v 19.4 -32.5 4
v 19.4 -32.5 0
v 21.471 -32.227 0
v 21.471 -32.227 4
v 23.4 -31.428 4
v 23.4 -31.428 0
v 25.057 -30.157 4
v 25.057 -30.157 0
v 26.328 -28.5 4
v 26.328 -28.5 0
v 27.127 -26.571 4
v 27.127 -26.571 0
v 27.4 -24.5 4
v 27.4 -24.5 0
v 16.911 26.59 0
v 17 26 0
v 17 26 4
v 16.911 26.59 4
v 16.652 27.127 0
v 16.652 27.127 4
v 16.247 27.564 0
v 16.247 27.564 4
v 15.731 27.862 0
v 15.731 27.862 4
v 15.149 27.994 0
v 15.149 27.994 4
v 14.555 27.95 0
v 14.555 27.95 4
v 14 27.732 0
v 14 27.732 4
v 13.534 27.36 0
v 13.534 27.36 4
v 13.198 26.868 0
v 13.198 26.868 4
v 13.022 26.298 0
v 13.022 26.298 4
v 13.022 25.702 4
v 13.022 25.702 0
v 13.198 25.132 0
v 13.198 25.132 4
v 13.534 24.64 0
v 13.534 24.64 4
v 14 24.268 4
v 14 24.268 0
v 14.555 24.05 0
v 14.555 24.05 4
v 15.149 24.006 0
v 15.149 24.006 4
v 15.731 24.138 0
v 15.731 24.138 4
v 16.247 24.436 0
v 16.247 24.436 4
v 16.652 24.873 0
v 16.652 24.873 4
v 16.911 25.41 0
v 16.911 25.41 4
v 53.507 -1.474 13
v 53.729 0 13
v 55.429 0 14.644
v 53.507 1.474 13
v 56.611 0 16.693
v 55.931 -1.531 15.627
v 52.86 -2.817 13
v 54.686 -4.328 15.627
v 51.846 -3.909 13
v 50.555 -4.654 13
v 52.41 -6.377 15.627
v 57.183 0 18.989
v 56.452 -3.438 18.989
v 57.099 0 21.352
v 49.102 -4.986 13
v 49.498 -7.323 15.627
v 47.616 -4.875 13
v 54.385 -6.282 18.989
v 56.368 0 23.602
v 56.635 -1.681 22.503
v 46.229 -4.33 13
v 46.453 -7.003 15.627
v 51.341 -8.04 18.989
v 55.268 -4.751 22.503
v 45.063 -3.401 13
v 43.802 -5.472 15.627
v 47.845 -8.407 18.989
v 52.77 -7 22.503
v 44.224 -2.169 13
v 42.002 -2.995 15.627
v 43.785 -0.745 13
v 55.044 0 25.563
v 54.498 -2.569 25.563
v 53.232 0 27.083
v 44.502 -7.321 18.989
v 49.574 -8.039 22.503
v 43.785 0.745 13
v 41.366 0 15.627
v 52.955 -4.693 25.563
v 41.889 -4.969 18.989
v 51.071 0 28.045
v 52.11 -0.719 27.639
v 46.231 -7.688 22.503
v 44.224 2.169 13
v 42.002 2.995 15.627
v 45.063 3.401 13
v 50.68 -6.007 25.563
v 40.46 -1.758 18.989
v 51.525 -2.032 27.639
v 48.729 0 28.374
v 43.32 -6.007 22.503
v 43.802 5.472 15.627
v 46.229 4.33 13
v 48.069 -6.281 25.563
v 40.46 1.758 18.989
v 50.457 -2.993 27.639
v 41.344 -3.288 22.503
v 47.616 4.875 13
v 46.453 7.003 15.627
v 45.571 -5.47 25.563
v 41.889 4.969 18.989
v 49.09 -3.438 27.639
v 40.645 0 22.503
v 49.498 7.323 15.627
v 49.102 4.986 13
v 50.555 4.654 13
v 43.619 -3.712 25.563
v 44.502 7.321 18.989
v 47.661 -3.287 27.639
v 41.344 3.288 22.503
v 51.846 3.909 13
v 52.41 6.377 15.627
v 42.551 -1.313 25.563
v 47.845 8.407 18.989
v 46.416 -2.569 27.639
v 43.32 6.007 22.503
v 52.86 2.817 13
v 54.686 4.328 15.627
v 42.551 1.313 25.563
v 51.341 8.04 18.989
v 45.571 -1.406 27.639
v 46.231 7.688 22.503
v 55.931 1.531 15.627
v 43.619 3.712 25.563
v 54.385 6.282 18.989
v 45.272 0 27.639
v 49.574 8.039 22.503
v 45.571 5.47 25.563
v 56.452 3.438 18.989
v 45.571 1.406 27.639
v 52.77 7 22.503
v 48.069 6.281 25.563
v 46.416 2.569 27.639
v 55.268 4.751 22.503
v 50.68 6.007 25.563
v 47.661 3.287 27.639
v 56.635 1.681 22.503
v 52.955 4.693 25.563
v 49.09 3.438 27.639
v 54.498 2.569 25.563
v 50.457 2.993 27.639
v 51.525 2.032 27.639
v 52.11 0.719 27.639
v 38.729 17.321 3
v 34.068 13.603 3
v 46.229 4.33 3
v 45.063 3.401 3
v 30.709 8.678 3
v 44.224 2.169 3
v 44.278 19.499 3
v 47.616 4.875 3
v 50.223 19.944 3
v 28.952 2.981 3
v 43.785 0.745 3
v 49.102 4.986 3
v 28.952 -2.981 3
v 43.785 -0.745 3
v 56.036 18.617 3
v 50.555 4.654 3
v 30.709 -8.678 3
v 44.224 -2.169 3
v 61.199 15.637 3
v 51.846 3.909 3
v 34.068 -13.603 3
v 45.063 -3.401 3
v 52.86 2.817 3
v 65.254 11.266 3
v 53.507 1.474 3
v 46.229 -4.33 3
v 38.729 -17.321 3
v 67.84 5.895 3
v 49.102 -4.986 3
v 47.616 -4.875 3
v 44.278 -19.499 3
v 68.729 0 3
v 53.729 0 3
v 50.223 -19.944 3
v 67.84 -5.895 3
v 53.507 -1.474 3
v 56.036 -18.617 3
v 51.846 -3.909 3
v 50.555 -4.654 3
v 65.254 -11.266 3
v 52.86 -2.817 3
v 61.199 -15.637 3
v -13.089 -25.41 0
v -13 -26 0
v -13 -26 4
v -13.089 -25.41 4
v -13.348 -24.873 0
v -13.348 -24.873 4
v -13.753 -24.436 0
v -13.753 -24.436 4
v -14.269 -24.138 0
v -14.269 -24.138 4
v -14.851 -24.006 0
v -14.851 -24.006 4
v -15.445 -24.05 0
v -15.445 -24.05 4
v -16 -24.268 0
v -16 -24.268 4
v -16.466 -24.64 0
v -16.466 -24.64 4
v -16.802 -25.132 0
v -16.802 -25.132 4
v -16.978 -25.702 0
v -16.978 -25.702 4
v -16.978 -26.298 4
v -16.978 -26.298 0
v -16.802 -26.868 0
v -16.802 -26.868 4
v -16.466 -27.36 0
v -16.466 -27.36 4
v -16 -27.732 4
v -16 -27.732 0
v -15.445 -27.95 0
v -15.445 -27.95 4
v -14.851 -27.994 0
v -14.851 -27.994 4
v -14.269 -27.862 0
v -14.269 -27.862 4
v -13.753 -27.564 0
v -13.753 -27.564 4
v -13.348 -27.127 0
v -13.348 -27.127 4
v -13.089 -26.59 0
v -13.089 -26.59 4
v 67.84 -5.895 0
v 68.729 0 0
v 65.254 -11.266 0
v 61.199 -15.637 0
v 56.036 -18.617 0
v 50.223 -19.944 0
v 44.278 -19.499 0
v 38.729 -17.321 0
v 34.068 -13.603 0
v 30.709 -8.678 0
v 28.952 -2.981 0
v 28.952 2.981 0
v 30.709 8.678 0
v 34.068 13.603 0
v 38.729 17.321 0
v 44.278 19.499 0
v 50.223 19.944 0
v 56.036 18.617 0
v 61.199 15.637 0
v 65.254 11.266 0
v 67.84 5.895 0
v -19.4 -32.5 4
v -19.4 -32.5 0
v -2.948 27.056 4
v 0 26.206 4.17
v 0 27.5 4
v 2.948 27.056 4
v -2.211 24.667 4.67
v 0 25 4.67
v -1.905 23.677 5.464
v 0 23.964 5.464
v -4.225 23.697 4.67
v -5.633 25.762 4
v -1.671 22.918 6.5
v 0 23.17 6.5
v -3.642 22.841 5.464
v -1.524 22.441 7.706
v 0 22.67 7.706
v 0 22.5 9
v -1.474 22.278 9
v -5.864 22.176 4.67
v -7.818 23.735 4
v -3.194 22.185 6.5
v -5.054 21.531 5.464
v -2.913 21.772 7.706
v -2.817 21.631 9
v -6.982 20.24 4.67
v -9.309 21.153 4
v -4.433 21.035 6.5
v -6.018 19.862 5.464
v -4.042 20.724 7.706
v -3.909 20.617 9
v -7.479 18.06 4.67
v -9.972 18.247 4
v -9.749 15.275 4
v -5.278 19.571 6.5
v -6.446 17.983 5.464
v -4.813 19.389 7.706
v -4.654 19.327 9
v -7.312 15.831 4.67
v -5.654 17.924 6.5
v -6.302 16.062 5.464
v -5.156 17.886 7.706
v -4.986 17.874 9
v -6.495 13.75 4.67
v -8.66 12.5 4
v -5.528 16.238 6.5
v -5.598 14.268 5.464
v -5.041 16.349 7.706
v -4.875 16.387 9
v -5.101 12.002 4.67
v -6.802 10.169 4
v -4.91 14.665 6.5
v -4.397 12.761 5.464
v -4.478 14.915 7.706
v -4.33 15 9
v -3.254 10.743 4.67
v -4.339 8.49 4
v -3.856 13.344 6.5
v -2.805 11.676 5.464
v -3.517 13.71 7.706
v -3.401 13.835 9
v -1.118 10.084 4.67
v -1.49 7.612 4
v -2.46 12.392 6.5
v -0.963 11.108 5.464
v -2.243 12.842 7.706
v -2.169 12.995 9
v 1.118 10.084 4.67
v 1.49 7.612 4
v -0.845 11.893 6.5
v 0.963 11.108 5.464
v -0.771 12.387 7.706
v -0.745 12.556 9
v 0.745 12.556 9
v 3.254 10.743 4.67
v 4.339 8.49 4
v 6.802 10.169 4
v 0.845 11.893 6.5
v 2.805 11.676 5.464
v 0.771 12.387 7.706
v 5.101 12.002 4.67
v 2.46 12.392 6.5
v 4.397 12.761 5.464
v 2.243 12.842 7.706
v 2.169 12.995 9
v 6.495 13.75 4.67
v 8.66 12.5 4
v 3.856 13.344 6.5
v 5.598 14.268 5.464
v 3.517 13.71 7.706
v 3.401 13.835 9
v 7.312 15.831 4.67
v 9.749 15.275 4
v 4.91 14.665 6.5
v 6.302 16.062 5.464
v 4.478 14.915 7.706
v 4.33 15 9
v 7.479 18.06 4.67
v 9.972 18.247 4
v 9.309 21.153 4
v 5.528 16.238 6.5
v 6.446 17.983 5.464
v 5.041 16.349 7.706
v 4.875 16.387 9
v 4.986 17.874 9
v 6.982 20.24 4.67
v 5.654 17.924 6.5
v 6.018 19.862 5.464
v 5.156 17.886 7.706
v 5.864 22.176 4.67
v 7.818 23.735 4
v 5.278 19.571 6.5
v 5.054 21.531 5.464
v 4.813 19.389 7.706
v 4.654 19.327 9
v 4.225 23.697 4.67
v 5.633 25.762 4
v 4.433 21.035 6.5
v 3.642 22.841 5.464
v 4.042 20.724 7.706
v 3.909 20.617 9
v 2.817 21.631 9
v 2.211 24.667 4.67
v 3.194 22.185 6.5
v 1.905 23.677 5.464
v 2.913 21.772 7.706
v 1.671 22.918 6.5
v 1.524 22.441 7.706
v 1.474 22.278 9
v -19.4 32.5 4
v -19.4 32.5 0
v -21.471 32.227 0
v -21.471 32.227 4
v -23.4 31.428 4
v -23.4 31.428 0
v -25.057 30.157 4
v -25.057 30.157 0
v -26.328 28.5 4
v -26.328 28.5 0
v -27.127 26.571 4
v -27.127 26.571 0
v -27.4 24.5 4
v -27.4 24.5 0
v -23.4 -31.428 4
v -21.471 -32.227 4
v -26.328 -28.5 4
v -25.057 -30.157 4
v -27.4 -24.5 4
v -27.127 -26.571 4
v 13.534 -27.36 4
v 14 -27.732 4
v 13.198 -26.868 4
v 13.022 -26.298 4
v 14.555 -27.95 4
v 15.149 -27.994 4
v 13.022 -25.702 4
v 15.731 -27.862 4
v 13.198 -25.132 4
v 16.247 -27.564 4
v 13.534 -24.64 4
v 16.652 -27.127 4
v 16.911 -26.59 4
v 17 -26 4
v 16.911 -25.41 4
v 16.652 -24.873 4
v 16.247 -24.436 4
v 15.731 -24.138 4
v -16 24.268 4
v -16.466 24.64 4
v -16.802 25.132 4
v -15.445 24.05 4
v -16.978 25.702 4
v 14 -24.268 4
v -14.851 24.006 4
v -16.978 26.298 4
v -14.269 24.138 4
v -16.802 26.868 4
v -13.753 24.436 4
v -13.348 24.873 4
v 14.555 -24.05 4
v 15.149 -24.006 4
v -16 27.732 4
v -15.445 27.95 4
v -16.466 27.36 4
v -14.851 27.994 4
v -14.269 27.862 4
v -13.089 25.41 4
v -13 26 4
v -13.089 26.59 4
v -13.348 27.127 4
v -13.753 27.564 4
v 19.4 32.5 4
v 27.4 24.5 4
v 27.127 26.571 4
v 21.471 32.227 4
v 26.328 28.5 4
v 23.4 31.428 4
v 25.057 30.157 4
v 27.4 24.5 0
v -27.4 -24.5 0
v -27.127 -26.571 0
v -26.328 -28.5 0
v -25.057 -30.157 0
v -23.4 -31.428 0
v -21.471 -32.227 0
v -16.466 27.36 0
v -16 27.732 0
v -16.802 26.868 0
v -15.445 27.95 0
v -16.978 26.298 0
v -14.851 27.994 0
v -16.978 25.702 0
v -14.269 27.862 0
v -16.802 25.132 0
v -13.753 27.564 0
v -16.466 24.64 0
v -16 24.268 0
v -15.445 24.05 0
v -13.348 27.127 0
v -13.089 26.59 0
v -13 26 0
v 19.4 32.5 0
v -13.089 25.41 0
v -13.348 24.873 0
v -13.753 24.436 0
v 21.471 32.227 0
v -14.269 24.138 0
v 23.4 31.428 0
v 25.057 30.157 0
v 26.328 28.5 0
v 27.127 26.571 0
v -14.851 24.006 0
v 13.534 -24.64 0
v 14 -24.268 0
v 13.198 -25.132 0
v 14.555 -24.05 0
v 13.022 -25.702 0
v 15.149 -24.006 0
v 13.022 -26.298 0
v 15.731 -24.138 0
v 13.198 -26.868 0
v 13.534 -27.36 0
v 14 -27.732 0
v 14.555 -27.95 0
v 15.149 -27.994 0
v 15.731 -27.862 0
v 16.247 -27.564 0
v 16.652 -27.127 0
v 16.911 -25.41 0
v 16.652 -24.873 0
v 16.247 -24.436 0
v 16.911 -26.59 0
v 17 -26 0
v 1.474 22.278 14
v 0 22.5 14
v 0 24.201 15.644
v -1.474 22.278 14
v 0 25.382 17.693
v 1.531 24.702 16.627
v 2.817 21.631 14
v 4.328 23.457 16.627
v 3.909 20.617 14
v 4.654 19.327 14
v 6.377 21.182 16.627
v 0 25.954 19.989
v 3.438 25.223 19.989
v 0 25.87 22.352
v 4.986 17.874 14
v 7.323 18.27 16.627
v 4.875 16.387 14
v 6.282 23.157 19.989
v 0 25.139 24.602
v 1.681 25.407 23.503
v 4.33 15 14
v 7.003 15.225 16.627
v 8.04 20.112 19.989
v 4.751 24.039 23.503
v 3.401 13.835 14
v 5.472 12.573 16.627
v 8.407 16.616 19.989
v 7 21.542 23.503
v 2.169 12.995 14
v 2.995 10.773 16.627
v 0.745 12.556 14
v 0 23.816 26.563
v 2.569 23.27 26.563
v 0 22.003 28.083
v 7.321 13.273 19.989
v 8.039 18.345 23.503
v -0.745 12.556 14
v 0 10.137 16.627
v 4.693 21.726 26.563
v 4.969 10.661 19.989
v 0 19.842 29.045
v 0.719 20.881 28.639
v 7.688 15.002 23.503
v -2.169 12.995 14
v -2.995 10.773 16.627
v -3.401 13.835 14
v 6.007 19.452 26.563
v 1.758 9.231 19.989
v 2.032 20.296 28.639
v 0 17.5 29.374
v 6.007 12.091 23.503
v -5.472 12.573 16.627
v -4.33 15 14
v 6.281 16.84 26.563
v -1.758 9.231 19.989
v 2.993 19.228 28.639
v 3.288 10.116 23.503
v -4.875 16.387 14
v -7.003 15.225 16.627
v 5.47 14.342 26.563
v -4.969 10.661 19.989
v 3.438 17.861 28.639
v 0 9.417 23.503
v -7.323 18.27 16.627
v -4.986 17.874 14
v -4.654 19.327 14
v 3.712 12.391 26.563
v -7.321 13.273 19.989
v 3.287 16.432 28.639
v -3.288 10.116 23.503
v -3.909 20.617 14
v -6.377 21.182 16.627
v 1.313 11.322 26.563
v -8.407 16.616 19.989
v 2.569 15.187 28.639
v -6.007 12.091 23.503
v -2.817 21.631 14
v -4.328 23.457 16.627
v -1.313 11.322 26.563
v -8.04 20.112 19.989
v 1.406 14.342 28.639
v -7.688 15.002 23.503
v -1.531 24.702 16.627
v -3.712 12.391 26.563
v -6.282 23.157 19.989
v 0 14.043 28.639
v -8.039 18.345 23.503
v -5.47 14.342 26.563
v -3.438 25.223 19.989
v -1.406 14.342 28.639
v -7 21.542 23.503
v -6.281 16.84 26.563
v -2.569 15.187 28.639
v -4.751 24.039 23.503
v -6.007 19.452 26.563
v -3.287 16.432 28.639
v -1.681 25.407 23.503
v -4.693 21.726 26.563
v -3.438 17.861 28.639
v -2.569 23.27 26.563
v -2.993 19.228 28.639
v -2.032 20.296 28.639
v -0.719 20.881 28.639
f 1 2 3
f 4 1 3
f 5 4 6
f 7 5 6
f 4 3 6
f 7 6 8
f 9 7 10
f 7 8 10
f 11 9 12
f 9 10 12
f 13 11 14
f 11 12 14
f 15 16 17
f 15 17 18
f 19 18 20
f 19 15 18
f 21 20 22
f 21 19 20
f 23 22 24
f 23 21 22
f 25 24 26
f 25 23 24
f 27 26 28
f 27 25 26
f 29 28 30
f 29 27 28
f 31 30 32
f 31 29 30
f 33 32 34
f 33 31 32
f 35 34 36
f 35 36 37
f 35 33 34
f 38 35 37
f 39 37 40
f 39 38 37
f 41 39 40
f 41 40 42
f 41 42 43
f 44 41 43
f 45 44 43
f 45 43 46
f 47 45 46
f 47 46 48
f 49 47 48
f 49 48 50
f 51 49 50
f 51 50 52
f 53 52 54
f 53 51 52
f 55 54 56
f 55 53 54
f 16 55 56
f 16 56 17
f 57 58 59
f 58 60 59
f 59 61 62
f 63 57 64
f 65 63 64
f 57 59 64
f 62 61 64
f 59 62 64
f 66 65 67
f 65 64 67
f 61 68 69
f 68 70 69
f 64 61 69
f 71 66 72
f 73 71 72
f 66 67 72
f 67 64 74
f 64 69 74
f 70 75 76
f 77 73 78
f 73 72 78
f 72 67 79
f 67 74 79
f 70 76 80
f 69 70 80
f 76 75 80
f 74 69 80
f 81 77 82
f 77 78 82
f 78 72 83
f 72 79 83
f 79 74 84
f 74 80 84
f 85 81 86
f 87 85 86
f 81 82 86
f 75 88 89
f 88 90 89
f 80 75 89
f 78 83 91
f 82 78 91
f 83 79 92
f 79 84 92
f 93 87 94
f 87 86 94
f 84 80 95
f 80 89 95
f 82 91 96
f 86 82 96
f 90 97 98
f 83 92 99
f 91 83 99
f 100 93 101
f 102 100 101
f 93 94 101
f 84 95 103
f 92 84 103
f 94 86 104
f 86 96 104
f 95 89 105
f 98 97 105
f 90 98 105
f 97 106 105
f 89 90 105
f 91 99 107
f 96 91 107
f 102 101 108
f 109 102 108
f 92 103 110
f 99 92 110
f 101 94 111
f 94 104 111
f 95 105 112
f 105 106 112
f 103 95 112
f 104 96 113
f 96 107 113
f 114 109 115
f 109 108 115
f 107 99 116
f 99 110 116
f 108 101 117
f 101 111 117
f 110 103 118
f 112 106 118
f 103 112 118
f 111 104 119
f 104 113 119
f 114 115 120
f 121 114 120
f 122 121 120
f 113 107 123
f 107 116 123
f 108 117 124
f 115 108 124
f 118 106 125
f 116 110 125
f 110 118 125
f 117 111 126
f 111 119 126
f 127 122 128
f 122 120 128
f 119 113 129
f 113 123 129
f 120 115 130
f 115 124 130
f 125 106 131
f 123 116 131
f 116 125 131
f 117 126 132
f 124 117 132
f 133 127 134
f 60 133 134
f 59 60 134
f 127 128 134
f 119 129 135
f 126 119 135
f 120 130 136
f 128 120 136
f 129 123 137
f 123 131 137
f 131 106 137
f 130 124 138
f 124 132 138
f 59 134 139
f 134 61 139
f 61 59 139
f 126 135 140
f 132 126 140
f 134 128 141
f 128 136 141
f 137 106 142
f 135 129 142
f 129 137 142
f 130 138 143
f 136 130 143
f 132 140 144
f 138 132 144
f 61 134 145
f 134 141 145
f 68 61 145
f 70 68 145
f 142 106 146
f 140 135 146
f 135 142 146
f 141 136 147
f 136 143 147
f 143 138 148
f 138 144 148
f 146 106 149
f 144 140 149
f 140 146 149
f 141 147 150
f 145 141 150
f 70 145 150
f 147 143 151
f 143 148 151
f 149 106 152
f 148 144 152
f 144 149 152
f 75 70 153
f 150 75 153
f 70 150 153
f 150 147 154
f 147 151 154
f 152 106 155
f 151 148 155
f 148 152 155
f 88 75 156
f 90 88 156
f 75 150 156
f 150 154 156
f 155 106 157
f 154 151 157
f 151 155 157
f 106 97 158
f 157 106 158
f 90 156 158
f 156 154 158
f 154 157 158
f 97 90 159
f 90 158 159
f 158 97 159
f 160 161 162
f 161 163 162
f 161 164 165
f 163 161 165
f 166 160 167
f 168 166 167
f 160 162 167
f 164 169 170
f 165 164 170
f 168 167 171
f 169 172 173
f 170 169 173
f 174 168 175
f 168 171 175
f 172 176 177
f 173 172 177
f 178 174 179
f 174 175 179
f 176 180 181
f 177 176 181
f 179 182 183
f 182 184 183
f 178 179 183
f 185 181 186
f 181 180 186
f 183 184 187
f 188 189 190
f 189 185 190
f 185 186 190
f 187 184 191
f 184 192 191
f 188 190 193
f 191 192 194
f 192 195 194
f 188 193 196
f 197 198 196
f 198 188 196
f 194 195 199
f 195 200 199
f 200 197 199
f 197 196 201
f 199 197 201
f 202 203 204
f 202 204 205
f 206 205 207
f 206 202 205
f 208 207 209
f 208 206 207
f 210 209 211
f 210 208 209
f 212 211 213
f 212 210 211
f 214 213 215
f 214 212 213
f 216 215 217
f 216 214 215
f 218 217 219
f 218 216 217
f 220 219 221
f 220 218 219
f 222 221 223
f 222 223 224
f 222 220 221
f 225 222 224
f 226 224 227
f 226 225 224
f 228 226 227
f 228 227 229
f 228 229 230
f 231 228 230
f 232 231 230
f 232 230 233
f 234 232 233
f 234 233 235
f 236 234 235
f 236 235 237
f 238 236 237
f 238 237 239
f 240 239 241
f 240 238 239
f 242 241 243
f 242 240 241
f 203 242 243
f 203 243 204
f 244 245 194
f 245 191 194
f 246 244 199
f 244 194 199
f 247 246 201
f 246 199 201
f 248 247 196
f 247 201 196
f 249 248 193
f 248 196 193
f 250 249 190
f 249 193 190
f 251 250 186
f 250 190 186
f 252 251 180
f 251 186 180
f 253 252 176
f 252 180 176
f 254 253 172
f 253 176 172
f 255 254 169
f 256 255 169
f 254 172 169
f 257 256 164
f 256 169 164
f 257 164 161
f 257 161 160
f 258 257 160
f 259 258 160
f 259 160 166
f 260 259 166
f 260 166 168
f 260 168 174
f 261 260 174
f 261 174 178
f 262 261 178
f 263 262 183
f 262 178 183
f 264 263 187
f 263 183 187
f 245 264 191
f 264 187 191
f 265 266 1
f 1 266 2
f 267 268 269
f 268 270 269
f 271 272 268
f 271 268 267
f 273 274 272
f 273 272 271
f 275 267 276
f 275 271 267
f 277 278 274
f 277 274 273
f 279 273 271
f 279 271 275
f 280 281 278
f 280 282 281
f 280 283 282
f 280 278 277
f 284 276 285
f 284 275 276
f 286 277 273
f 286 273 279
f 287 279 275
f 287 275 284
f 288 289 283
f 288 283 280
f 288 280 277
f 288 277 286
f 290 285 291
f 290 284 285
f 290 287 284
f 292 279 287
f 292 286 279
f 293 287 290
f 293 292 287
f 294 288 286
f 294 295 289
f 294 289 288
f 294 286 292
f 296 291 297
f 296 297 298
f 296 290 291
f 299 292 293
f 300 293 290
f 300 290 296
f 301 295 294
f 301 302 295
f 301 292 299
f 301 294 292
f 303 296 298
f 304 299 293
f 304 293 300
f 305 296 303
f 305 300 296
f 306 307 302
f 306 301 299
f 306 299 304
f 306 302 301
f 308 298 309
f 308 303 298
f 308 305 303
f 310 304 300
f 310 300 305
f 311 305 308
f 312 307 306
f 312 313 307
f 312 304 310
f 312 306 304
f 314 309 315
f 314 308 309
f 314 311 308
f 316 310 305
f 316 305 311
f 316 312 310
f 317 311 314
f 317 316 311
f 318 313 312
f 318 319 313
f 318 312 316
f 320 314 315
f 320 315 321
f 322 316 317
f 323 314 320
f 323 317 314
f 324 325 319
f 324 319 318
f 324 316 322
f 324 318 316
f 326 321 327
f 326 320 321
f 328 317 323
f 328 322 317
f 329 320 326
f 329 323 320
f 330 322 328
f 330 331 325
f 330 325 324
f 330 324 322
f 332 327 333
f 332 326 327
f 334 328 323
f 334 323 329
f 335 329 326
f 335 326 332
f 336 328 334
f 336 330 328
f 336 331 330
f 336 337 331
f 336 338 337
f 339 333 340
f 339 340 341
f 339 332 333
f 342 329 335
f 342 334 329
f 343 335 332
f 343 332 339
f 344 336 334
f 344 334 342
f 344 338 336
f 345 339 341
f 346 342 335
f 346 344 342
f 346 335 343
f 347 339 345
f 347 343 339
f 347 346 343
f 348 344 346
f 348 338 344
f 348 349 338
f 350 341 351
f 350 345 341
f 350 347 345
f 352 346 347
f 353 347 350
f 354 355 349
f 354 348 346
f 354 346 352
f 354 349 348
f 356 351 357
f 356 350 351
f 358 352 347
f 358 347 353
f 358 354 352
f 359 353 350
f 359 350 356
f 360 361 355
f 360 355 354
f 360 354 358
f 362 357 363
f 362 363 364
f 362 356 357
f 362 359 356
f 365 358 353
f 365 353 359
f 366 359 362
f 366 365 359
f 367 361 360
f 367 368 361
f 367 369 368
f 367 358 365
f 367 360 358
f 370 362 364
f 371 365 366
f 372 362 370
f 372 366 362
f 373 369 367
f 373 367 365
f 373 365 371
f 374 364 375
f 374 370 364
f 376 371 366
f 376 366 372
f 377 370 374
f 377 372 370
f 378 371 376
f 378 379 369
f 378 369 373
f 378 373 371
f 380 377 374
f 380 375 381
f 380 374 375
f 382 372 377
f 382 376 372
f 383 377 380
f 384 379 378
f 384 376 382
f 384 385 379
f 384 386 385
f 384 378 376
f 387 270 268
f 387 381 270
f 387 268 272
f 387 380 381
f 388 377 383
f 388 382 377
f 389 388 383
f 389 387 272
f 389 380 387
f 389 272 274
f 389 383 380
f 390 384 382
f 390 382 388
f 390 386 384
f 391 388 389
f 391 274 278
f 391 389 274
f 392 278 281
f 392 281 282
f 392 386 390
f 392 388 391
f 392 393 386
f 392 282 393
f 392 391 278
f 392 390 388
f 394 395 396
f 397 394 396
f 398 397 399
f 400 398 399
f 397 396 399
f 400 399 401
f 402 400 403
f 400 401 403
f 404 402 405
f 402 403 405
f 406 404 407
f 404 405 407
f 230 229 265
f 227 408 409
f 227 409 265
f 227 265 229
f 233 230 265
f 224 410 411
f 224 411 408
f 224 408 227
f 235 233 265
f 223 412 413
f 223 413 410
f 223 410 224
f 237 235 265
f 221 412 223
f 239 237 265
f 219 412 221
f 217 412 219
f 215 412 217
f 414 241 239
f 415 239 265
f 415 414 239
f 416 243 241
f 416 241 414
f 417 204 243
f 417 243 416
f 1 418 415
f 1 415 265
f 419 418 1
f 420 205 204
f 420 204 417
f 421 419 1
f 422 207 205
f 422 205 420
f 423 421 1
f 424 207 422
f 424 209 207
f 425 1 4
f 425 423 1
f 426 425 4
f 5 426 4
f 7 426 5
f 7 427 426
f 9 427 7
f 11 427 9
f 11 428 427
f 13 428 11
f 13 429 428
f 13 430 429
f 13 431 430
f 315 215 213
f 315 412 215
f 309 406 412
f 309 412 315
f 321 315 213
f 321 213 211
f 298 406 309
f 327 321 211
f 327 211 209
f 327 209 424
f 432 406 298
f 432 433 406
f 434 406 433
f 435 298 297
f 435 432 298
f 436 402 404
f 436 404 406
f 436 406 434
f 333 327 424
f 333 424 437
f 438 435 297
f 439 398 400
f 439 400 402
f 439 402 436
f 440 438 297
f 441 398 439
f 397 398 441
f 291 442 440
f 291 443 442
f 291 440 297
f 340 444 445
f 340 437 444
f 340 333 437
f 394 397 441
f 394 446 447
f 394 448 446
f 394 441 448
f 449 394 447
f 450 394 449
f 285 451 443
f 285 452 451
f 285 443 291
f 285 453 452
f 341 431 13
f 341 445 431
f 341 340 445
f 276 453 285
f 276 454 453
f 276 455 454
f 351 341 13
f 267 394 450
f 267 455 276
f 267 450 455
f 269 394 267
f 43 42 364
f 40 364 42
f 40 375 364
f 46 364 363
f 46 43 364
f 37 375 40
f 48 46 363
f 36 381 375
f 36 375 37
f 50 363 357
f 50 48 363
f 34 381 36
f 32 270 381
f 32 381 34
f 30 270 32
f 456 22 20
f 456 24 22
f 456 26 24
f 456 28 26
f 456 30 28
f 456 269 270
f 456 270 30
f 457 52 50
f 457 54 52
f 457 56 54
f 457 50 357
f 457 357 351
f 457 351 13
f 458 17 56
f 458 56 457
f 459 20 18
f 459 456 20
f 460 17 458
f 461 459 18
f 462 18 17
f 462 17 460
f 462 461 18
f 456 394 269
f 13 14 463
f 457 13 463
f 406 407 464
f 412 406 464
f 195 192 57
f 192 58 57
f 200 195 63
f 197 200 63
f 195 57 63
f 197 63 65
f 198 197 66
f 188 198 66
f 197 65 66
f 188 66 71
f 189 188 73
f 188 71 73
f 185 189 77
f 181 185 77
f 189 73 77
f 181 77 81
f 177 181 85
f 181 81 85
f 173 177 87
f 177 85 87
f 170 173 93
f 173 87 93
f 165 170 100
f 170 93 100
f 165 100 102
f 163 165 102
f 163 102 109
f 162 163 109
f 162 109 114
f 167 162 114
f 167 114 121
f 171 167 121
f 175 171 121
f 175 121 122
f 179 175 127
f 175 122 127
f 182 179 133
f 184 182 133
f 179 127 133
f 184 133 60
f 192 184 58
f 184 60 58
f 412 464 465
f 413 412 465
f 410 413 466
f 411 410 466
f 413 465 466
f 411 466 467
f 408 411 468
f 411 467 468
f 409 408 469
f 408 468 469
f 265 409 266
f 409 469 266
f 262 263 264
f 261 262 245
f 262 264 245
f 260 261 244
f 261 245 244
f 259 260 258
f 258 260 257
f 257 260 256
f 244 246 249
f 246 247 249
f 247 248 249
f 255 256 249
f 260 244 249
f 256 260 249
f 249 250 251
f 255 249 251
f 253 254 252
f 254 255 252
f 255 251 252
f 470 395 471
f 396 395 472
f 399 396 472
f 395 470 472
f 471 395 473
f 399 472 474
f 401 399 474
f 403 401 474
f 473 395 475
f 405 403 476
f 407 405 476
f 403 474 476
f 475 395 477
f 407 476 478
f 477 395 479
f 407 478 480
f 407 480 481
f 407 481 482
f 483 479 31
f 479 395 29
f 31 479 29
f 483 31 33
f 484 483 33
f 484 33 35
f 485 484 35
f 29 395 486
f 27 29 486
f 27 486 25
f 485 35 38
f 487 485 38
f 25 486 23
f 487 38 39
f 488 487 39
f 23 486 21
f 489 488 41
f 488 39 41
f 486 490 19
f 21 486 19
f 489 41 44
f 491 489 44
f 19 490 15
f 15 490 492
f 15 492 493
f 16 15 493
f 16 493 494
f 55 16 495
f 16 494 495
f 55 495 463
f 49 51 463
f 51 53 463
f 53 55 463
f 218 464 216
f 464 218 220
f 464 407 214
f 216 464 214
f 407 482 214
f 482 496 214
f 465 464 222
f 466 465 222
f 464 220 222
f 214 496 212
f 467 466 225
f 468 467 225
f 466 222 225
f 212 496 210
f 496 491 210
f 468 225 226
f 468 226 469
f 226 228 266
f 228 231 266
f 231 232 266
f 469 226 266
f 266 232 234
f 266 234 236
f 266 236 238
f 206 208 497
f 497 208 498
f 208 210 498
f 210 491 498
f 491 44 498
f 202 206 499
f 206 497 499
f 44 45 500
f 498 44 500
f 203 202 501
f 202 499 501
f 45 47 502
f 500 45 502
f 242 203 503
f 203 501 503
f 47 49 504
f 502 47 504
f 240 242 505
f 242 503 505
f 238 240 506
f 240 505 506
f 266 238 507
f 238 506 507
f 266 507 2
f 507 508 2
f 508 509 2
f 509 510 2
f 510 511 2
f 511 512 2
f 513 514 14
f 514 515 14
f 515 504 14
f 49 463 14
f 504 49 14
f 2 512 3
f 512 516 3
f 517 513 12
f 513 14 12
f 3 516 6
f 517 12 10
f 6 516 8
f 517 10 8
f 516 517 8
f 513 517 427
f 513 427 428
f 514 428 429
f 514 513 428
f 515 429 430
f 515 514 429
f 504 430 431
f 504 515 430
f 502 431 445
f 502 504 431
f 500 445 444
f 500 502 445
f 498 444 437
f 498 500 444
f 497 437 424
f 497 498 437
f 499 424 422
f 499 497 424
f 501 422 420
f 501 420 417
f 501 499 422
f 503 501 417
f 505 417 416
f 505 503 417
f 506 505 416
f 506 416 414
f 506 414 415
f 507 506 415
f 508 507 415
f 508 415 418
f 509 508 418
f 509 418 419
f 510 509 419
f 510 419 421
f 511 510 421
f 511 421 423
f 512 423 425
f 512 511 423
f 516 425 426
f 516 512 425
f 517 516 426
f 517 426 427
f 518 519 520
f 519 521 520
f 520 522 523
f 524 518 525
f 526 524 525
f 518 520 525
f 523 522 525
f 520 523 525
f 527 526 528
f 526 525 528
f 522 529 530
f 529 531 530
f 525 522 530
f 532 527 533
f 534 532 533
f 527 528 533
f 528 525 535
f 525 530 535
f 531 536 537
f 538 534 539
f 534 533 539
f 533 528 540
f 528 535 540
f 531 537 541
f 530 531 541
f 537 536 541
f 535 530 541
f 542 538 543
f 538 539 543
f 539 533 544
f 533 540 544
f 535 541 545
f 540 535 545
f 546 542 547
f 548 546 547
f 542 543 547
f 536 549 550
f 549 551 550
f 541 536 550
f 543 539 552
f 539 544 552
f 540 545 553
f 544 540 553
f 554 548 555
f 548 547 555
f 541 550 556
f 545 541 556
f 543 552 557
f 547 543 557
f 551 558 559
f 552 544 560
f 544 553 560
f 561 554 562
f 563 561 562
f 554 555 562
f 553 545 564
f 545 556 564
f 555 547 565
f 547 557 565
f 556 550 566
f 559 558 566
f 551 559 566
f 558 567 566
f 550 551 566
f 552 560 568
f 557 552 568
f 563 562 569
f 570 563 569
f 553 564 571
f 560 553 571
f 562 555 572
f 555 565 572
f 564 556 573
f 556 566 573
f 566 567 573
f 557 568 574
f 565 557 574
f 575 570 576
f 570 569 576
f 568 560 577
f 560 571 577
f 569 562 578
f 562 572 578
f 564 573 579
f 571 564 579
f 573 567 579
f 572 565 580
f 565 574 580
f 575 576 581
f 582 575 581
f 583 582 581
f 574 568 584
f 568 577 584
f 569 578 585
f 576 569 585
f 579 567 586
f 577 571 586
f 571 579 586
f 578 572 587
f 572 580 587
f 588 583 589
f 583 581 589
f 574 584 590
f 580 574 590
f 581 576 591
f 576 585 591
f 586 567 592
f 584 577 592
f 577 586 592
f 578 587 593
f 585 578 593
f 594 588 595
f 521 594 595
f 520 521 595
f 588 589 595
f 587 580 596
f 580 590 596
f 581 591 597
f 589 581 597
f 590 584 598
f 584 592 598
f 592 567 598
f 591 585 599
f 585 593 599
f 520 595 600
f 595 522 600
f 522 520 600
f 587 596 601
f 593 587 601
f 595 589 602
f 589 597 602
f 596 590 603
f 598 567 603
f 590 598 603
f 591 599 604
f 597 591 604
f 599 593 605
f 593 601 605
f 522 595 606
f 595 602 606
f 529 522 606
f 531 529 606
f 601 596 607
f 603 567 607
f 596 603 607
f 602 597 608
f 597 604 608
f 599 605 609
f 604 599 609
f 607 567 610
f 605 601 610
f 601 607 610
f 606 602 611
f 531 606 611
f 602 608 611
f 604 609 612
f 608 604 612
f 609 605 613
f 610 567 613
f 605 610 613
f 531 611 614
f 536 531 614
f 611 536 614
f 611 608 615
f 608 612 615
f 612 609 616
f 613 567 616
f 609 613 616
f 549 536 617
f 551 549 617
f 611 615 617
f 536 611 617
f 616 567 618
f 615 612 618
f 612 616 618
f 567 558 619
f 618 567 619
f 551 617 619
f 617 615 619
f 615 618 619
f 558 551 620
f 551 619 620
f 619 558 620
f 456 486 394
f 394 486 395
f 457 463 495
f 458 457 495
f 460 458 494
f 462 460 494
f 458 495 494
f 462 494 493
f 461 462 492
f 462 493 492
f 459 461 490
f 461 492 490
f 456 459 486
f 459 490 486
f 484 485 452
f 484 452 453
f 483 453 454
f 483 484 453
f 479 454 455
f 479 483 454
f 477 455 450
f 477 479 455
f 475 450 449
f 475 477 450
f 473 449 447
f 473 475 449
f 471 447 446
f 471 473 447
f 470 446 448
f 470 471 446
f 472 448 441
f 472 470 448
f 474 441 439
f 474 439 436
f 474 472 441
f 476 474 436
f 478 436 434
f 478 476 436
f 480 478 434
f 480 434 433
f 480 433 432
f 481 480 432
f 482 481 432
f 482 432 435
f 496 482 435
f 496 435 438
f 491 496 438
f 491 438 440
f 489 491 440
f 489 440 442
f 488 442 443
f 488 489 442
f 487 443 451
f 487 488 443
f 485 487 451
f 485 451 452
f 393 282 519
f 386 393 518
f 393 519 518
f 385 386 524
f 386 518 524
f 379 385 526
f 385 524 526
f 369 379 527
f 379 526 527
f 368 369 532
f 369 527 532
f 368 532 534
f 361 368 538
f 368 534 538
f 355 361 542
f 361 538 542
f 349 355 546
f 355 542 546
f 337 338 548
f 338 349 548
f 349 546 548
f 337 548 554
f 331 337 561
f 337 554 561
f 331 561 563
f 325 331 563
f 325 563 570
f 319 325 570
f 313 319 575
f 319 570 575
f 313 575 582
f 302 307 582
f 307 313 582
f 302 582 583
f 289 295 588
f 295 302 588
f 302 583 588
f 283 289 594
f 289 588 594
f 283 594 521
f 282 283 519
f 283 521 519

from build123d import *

# Parameters (mm, degrees)
F0_R     = 2
F1_DEPTH = 4
F4_R     = 5


with BuildPart() as f1:
    # F0 (on Top) → F1 (new body)
    with BuildSketch(Plane.XY):
        with BuildLine():
            ThreePointArc((-27.4, -24.5), (-25.0568542495, -30.1568542495), (-19.4, -32.5))
            Line((-19.4, -32.5), (19.4, -32.5))
            ThreePointArc((19.4, -32.5), (25.0568542495, -30.1568542495), (27.4, -24.5))
            Line((27.4, -24.5), (27.4, 24.5))
            ThreePointArc((27.4, 24.5), (25.0568542495, 30.1568542495), (19.4, 32.5))
            Line((19.4, 32.5), (-19.4, 32.5))
            ThreePointArc((-19.4, 32.5), (-25.0568542495, 30.1568542495), (-27.4, 24.5))
            Line((-27.4, 24.5), (-27.4, -24.5))
        make_face()
        with Locations((-15, -26)):
            Circle(F0_R, mode=Mode.SUBTRACT)
        with Locations((15, -26)):
            Circle(F0_R, mode=Mode.SUBTRACT)
        with Locations((-15, 26)):
            Circle(F0_R, mode=Mode.SUBTRACT)
        with Locations((15, 26)):
            Circle(F0_R, mode=Mode.SUBTRACT)
    extrude(amount=F1_DEPTH)

    # F2 (on Right) → F3 (revolve)
    with BuildSketch(Plane.YZ):
        with BuildLine():
            Line((17.5, 20.8738635424), (17.5, 0))
            Line((17.5, 0), (22.5, 0))
            Line((22.5, 0), (22.5, 14))
            ThreePointArc((22.5, 14), (25.5832493501, 23.5027568352), (17.5, 29.3738635424))
            Line((17.5, 29.3738635424), (17.5, 20.8738635424))
        make_face()
    revolve(axis=Axis((0, 17.5, 10.4369317712), (0, 0, -1)))

    # F4
    f4_edges = [f1.edges().sort_by_distance(p)[0] for p in [
        (0, 12.5, 4),
    ]]
    fillet(f4_edges, radius=F4_R)


with BuildPart() as f6:
    # F5 (on Front) → F6 (revolve)
    with BuildSketch(Plane.XZ):
        with BuildLine():
            Line((48.7287359181, 28.3738635424), (48.7287359181, 19.8738635424))
            Line((48.7287359181, 19.8738635424), (48.7287359181, 0))
            Line((48.7287359181, 0), (68.7287359181, 0))
            Line((68.7287359181, 0), (68.7287359181, 3))
            Line((68.7287359181, 3), (53.7287359181, 3))
            Line((53.7287359181, 3), (53.7287359181, 13))
            ThreePointArc((53.7287359181, 13), (56.8119852681, 22.5027568352), (48.7287359181, 28.3738635424))
        make_face()
    revolve(axis=Axis((48.7287359181, 0, 5.0727854547), (0, 0, -1)))


solid = Compound([f1.part, f6.part])
